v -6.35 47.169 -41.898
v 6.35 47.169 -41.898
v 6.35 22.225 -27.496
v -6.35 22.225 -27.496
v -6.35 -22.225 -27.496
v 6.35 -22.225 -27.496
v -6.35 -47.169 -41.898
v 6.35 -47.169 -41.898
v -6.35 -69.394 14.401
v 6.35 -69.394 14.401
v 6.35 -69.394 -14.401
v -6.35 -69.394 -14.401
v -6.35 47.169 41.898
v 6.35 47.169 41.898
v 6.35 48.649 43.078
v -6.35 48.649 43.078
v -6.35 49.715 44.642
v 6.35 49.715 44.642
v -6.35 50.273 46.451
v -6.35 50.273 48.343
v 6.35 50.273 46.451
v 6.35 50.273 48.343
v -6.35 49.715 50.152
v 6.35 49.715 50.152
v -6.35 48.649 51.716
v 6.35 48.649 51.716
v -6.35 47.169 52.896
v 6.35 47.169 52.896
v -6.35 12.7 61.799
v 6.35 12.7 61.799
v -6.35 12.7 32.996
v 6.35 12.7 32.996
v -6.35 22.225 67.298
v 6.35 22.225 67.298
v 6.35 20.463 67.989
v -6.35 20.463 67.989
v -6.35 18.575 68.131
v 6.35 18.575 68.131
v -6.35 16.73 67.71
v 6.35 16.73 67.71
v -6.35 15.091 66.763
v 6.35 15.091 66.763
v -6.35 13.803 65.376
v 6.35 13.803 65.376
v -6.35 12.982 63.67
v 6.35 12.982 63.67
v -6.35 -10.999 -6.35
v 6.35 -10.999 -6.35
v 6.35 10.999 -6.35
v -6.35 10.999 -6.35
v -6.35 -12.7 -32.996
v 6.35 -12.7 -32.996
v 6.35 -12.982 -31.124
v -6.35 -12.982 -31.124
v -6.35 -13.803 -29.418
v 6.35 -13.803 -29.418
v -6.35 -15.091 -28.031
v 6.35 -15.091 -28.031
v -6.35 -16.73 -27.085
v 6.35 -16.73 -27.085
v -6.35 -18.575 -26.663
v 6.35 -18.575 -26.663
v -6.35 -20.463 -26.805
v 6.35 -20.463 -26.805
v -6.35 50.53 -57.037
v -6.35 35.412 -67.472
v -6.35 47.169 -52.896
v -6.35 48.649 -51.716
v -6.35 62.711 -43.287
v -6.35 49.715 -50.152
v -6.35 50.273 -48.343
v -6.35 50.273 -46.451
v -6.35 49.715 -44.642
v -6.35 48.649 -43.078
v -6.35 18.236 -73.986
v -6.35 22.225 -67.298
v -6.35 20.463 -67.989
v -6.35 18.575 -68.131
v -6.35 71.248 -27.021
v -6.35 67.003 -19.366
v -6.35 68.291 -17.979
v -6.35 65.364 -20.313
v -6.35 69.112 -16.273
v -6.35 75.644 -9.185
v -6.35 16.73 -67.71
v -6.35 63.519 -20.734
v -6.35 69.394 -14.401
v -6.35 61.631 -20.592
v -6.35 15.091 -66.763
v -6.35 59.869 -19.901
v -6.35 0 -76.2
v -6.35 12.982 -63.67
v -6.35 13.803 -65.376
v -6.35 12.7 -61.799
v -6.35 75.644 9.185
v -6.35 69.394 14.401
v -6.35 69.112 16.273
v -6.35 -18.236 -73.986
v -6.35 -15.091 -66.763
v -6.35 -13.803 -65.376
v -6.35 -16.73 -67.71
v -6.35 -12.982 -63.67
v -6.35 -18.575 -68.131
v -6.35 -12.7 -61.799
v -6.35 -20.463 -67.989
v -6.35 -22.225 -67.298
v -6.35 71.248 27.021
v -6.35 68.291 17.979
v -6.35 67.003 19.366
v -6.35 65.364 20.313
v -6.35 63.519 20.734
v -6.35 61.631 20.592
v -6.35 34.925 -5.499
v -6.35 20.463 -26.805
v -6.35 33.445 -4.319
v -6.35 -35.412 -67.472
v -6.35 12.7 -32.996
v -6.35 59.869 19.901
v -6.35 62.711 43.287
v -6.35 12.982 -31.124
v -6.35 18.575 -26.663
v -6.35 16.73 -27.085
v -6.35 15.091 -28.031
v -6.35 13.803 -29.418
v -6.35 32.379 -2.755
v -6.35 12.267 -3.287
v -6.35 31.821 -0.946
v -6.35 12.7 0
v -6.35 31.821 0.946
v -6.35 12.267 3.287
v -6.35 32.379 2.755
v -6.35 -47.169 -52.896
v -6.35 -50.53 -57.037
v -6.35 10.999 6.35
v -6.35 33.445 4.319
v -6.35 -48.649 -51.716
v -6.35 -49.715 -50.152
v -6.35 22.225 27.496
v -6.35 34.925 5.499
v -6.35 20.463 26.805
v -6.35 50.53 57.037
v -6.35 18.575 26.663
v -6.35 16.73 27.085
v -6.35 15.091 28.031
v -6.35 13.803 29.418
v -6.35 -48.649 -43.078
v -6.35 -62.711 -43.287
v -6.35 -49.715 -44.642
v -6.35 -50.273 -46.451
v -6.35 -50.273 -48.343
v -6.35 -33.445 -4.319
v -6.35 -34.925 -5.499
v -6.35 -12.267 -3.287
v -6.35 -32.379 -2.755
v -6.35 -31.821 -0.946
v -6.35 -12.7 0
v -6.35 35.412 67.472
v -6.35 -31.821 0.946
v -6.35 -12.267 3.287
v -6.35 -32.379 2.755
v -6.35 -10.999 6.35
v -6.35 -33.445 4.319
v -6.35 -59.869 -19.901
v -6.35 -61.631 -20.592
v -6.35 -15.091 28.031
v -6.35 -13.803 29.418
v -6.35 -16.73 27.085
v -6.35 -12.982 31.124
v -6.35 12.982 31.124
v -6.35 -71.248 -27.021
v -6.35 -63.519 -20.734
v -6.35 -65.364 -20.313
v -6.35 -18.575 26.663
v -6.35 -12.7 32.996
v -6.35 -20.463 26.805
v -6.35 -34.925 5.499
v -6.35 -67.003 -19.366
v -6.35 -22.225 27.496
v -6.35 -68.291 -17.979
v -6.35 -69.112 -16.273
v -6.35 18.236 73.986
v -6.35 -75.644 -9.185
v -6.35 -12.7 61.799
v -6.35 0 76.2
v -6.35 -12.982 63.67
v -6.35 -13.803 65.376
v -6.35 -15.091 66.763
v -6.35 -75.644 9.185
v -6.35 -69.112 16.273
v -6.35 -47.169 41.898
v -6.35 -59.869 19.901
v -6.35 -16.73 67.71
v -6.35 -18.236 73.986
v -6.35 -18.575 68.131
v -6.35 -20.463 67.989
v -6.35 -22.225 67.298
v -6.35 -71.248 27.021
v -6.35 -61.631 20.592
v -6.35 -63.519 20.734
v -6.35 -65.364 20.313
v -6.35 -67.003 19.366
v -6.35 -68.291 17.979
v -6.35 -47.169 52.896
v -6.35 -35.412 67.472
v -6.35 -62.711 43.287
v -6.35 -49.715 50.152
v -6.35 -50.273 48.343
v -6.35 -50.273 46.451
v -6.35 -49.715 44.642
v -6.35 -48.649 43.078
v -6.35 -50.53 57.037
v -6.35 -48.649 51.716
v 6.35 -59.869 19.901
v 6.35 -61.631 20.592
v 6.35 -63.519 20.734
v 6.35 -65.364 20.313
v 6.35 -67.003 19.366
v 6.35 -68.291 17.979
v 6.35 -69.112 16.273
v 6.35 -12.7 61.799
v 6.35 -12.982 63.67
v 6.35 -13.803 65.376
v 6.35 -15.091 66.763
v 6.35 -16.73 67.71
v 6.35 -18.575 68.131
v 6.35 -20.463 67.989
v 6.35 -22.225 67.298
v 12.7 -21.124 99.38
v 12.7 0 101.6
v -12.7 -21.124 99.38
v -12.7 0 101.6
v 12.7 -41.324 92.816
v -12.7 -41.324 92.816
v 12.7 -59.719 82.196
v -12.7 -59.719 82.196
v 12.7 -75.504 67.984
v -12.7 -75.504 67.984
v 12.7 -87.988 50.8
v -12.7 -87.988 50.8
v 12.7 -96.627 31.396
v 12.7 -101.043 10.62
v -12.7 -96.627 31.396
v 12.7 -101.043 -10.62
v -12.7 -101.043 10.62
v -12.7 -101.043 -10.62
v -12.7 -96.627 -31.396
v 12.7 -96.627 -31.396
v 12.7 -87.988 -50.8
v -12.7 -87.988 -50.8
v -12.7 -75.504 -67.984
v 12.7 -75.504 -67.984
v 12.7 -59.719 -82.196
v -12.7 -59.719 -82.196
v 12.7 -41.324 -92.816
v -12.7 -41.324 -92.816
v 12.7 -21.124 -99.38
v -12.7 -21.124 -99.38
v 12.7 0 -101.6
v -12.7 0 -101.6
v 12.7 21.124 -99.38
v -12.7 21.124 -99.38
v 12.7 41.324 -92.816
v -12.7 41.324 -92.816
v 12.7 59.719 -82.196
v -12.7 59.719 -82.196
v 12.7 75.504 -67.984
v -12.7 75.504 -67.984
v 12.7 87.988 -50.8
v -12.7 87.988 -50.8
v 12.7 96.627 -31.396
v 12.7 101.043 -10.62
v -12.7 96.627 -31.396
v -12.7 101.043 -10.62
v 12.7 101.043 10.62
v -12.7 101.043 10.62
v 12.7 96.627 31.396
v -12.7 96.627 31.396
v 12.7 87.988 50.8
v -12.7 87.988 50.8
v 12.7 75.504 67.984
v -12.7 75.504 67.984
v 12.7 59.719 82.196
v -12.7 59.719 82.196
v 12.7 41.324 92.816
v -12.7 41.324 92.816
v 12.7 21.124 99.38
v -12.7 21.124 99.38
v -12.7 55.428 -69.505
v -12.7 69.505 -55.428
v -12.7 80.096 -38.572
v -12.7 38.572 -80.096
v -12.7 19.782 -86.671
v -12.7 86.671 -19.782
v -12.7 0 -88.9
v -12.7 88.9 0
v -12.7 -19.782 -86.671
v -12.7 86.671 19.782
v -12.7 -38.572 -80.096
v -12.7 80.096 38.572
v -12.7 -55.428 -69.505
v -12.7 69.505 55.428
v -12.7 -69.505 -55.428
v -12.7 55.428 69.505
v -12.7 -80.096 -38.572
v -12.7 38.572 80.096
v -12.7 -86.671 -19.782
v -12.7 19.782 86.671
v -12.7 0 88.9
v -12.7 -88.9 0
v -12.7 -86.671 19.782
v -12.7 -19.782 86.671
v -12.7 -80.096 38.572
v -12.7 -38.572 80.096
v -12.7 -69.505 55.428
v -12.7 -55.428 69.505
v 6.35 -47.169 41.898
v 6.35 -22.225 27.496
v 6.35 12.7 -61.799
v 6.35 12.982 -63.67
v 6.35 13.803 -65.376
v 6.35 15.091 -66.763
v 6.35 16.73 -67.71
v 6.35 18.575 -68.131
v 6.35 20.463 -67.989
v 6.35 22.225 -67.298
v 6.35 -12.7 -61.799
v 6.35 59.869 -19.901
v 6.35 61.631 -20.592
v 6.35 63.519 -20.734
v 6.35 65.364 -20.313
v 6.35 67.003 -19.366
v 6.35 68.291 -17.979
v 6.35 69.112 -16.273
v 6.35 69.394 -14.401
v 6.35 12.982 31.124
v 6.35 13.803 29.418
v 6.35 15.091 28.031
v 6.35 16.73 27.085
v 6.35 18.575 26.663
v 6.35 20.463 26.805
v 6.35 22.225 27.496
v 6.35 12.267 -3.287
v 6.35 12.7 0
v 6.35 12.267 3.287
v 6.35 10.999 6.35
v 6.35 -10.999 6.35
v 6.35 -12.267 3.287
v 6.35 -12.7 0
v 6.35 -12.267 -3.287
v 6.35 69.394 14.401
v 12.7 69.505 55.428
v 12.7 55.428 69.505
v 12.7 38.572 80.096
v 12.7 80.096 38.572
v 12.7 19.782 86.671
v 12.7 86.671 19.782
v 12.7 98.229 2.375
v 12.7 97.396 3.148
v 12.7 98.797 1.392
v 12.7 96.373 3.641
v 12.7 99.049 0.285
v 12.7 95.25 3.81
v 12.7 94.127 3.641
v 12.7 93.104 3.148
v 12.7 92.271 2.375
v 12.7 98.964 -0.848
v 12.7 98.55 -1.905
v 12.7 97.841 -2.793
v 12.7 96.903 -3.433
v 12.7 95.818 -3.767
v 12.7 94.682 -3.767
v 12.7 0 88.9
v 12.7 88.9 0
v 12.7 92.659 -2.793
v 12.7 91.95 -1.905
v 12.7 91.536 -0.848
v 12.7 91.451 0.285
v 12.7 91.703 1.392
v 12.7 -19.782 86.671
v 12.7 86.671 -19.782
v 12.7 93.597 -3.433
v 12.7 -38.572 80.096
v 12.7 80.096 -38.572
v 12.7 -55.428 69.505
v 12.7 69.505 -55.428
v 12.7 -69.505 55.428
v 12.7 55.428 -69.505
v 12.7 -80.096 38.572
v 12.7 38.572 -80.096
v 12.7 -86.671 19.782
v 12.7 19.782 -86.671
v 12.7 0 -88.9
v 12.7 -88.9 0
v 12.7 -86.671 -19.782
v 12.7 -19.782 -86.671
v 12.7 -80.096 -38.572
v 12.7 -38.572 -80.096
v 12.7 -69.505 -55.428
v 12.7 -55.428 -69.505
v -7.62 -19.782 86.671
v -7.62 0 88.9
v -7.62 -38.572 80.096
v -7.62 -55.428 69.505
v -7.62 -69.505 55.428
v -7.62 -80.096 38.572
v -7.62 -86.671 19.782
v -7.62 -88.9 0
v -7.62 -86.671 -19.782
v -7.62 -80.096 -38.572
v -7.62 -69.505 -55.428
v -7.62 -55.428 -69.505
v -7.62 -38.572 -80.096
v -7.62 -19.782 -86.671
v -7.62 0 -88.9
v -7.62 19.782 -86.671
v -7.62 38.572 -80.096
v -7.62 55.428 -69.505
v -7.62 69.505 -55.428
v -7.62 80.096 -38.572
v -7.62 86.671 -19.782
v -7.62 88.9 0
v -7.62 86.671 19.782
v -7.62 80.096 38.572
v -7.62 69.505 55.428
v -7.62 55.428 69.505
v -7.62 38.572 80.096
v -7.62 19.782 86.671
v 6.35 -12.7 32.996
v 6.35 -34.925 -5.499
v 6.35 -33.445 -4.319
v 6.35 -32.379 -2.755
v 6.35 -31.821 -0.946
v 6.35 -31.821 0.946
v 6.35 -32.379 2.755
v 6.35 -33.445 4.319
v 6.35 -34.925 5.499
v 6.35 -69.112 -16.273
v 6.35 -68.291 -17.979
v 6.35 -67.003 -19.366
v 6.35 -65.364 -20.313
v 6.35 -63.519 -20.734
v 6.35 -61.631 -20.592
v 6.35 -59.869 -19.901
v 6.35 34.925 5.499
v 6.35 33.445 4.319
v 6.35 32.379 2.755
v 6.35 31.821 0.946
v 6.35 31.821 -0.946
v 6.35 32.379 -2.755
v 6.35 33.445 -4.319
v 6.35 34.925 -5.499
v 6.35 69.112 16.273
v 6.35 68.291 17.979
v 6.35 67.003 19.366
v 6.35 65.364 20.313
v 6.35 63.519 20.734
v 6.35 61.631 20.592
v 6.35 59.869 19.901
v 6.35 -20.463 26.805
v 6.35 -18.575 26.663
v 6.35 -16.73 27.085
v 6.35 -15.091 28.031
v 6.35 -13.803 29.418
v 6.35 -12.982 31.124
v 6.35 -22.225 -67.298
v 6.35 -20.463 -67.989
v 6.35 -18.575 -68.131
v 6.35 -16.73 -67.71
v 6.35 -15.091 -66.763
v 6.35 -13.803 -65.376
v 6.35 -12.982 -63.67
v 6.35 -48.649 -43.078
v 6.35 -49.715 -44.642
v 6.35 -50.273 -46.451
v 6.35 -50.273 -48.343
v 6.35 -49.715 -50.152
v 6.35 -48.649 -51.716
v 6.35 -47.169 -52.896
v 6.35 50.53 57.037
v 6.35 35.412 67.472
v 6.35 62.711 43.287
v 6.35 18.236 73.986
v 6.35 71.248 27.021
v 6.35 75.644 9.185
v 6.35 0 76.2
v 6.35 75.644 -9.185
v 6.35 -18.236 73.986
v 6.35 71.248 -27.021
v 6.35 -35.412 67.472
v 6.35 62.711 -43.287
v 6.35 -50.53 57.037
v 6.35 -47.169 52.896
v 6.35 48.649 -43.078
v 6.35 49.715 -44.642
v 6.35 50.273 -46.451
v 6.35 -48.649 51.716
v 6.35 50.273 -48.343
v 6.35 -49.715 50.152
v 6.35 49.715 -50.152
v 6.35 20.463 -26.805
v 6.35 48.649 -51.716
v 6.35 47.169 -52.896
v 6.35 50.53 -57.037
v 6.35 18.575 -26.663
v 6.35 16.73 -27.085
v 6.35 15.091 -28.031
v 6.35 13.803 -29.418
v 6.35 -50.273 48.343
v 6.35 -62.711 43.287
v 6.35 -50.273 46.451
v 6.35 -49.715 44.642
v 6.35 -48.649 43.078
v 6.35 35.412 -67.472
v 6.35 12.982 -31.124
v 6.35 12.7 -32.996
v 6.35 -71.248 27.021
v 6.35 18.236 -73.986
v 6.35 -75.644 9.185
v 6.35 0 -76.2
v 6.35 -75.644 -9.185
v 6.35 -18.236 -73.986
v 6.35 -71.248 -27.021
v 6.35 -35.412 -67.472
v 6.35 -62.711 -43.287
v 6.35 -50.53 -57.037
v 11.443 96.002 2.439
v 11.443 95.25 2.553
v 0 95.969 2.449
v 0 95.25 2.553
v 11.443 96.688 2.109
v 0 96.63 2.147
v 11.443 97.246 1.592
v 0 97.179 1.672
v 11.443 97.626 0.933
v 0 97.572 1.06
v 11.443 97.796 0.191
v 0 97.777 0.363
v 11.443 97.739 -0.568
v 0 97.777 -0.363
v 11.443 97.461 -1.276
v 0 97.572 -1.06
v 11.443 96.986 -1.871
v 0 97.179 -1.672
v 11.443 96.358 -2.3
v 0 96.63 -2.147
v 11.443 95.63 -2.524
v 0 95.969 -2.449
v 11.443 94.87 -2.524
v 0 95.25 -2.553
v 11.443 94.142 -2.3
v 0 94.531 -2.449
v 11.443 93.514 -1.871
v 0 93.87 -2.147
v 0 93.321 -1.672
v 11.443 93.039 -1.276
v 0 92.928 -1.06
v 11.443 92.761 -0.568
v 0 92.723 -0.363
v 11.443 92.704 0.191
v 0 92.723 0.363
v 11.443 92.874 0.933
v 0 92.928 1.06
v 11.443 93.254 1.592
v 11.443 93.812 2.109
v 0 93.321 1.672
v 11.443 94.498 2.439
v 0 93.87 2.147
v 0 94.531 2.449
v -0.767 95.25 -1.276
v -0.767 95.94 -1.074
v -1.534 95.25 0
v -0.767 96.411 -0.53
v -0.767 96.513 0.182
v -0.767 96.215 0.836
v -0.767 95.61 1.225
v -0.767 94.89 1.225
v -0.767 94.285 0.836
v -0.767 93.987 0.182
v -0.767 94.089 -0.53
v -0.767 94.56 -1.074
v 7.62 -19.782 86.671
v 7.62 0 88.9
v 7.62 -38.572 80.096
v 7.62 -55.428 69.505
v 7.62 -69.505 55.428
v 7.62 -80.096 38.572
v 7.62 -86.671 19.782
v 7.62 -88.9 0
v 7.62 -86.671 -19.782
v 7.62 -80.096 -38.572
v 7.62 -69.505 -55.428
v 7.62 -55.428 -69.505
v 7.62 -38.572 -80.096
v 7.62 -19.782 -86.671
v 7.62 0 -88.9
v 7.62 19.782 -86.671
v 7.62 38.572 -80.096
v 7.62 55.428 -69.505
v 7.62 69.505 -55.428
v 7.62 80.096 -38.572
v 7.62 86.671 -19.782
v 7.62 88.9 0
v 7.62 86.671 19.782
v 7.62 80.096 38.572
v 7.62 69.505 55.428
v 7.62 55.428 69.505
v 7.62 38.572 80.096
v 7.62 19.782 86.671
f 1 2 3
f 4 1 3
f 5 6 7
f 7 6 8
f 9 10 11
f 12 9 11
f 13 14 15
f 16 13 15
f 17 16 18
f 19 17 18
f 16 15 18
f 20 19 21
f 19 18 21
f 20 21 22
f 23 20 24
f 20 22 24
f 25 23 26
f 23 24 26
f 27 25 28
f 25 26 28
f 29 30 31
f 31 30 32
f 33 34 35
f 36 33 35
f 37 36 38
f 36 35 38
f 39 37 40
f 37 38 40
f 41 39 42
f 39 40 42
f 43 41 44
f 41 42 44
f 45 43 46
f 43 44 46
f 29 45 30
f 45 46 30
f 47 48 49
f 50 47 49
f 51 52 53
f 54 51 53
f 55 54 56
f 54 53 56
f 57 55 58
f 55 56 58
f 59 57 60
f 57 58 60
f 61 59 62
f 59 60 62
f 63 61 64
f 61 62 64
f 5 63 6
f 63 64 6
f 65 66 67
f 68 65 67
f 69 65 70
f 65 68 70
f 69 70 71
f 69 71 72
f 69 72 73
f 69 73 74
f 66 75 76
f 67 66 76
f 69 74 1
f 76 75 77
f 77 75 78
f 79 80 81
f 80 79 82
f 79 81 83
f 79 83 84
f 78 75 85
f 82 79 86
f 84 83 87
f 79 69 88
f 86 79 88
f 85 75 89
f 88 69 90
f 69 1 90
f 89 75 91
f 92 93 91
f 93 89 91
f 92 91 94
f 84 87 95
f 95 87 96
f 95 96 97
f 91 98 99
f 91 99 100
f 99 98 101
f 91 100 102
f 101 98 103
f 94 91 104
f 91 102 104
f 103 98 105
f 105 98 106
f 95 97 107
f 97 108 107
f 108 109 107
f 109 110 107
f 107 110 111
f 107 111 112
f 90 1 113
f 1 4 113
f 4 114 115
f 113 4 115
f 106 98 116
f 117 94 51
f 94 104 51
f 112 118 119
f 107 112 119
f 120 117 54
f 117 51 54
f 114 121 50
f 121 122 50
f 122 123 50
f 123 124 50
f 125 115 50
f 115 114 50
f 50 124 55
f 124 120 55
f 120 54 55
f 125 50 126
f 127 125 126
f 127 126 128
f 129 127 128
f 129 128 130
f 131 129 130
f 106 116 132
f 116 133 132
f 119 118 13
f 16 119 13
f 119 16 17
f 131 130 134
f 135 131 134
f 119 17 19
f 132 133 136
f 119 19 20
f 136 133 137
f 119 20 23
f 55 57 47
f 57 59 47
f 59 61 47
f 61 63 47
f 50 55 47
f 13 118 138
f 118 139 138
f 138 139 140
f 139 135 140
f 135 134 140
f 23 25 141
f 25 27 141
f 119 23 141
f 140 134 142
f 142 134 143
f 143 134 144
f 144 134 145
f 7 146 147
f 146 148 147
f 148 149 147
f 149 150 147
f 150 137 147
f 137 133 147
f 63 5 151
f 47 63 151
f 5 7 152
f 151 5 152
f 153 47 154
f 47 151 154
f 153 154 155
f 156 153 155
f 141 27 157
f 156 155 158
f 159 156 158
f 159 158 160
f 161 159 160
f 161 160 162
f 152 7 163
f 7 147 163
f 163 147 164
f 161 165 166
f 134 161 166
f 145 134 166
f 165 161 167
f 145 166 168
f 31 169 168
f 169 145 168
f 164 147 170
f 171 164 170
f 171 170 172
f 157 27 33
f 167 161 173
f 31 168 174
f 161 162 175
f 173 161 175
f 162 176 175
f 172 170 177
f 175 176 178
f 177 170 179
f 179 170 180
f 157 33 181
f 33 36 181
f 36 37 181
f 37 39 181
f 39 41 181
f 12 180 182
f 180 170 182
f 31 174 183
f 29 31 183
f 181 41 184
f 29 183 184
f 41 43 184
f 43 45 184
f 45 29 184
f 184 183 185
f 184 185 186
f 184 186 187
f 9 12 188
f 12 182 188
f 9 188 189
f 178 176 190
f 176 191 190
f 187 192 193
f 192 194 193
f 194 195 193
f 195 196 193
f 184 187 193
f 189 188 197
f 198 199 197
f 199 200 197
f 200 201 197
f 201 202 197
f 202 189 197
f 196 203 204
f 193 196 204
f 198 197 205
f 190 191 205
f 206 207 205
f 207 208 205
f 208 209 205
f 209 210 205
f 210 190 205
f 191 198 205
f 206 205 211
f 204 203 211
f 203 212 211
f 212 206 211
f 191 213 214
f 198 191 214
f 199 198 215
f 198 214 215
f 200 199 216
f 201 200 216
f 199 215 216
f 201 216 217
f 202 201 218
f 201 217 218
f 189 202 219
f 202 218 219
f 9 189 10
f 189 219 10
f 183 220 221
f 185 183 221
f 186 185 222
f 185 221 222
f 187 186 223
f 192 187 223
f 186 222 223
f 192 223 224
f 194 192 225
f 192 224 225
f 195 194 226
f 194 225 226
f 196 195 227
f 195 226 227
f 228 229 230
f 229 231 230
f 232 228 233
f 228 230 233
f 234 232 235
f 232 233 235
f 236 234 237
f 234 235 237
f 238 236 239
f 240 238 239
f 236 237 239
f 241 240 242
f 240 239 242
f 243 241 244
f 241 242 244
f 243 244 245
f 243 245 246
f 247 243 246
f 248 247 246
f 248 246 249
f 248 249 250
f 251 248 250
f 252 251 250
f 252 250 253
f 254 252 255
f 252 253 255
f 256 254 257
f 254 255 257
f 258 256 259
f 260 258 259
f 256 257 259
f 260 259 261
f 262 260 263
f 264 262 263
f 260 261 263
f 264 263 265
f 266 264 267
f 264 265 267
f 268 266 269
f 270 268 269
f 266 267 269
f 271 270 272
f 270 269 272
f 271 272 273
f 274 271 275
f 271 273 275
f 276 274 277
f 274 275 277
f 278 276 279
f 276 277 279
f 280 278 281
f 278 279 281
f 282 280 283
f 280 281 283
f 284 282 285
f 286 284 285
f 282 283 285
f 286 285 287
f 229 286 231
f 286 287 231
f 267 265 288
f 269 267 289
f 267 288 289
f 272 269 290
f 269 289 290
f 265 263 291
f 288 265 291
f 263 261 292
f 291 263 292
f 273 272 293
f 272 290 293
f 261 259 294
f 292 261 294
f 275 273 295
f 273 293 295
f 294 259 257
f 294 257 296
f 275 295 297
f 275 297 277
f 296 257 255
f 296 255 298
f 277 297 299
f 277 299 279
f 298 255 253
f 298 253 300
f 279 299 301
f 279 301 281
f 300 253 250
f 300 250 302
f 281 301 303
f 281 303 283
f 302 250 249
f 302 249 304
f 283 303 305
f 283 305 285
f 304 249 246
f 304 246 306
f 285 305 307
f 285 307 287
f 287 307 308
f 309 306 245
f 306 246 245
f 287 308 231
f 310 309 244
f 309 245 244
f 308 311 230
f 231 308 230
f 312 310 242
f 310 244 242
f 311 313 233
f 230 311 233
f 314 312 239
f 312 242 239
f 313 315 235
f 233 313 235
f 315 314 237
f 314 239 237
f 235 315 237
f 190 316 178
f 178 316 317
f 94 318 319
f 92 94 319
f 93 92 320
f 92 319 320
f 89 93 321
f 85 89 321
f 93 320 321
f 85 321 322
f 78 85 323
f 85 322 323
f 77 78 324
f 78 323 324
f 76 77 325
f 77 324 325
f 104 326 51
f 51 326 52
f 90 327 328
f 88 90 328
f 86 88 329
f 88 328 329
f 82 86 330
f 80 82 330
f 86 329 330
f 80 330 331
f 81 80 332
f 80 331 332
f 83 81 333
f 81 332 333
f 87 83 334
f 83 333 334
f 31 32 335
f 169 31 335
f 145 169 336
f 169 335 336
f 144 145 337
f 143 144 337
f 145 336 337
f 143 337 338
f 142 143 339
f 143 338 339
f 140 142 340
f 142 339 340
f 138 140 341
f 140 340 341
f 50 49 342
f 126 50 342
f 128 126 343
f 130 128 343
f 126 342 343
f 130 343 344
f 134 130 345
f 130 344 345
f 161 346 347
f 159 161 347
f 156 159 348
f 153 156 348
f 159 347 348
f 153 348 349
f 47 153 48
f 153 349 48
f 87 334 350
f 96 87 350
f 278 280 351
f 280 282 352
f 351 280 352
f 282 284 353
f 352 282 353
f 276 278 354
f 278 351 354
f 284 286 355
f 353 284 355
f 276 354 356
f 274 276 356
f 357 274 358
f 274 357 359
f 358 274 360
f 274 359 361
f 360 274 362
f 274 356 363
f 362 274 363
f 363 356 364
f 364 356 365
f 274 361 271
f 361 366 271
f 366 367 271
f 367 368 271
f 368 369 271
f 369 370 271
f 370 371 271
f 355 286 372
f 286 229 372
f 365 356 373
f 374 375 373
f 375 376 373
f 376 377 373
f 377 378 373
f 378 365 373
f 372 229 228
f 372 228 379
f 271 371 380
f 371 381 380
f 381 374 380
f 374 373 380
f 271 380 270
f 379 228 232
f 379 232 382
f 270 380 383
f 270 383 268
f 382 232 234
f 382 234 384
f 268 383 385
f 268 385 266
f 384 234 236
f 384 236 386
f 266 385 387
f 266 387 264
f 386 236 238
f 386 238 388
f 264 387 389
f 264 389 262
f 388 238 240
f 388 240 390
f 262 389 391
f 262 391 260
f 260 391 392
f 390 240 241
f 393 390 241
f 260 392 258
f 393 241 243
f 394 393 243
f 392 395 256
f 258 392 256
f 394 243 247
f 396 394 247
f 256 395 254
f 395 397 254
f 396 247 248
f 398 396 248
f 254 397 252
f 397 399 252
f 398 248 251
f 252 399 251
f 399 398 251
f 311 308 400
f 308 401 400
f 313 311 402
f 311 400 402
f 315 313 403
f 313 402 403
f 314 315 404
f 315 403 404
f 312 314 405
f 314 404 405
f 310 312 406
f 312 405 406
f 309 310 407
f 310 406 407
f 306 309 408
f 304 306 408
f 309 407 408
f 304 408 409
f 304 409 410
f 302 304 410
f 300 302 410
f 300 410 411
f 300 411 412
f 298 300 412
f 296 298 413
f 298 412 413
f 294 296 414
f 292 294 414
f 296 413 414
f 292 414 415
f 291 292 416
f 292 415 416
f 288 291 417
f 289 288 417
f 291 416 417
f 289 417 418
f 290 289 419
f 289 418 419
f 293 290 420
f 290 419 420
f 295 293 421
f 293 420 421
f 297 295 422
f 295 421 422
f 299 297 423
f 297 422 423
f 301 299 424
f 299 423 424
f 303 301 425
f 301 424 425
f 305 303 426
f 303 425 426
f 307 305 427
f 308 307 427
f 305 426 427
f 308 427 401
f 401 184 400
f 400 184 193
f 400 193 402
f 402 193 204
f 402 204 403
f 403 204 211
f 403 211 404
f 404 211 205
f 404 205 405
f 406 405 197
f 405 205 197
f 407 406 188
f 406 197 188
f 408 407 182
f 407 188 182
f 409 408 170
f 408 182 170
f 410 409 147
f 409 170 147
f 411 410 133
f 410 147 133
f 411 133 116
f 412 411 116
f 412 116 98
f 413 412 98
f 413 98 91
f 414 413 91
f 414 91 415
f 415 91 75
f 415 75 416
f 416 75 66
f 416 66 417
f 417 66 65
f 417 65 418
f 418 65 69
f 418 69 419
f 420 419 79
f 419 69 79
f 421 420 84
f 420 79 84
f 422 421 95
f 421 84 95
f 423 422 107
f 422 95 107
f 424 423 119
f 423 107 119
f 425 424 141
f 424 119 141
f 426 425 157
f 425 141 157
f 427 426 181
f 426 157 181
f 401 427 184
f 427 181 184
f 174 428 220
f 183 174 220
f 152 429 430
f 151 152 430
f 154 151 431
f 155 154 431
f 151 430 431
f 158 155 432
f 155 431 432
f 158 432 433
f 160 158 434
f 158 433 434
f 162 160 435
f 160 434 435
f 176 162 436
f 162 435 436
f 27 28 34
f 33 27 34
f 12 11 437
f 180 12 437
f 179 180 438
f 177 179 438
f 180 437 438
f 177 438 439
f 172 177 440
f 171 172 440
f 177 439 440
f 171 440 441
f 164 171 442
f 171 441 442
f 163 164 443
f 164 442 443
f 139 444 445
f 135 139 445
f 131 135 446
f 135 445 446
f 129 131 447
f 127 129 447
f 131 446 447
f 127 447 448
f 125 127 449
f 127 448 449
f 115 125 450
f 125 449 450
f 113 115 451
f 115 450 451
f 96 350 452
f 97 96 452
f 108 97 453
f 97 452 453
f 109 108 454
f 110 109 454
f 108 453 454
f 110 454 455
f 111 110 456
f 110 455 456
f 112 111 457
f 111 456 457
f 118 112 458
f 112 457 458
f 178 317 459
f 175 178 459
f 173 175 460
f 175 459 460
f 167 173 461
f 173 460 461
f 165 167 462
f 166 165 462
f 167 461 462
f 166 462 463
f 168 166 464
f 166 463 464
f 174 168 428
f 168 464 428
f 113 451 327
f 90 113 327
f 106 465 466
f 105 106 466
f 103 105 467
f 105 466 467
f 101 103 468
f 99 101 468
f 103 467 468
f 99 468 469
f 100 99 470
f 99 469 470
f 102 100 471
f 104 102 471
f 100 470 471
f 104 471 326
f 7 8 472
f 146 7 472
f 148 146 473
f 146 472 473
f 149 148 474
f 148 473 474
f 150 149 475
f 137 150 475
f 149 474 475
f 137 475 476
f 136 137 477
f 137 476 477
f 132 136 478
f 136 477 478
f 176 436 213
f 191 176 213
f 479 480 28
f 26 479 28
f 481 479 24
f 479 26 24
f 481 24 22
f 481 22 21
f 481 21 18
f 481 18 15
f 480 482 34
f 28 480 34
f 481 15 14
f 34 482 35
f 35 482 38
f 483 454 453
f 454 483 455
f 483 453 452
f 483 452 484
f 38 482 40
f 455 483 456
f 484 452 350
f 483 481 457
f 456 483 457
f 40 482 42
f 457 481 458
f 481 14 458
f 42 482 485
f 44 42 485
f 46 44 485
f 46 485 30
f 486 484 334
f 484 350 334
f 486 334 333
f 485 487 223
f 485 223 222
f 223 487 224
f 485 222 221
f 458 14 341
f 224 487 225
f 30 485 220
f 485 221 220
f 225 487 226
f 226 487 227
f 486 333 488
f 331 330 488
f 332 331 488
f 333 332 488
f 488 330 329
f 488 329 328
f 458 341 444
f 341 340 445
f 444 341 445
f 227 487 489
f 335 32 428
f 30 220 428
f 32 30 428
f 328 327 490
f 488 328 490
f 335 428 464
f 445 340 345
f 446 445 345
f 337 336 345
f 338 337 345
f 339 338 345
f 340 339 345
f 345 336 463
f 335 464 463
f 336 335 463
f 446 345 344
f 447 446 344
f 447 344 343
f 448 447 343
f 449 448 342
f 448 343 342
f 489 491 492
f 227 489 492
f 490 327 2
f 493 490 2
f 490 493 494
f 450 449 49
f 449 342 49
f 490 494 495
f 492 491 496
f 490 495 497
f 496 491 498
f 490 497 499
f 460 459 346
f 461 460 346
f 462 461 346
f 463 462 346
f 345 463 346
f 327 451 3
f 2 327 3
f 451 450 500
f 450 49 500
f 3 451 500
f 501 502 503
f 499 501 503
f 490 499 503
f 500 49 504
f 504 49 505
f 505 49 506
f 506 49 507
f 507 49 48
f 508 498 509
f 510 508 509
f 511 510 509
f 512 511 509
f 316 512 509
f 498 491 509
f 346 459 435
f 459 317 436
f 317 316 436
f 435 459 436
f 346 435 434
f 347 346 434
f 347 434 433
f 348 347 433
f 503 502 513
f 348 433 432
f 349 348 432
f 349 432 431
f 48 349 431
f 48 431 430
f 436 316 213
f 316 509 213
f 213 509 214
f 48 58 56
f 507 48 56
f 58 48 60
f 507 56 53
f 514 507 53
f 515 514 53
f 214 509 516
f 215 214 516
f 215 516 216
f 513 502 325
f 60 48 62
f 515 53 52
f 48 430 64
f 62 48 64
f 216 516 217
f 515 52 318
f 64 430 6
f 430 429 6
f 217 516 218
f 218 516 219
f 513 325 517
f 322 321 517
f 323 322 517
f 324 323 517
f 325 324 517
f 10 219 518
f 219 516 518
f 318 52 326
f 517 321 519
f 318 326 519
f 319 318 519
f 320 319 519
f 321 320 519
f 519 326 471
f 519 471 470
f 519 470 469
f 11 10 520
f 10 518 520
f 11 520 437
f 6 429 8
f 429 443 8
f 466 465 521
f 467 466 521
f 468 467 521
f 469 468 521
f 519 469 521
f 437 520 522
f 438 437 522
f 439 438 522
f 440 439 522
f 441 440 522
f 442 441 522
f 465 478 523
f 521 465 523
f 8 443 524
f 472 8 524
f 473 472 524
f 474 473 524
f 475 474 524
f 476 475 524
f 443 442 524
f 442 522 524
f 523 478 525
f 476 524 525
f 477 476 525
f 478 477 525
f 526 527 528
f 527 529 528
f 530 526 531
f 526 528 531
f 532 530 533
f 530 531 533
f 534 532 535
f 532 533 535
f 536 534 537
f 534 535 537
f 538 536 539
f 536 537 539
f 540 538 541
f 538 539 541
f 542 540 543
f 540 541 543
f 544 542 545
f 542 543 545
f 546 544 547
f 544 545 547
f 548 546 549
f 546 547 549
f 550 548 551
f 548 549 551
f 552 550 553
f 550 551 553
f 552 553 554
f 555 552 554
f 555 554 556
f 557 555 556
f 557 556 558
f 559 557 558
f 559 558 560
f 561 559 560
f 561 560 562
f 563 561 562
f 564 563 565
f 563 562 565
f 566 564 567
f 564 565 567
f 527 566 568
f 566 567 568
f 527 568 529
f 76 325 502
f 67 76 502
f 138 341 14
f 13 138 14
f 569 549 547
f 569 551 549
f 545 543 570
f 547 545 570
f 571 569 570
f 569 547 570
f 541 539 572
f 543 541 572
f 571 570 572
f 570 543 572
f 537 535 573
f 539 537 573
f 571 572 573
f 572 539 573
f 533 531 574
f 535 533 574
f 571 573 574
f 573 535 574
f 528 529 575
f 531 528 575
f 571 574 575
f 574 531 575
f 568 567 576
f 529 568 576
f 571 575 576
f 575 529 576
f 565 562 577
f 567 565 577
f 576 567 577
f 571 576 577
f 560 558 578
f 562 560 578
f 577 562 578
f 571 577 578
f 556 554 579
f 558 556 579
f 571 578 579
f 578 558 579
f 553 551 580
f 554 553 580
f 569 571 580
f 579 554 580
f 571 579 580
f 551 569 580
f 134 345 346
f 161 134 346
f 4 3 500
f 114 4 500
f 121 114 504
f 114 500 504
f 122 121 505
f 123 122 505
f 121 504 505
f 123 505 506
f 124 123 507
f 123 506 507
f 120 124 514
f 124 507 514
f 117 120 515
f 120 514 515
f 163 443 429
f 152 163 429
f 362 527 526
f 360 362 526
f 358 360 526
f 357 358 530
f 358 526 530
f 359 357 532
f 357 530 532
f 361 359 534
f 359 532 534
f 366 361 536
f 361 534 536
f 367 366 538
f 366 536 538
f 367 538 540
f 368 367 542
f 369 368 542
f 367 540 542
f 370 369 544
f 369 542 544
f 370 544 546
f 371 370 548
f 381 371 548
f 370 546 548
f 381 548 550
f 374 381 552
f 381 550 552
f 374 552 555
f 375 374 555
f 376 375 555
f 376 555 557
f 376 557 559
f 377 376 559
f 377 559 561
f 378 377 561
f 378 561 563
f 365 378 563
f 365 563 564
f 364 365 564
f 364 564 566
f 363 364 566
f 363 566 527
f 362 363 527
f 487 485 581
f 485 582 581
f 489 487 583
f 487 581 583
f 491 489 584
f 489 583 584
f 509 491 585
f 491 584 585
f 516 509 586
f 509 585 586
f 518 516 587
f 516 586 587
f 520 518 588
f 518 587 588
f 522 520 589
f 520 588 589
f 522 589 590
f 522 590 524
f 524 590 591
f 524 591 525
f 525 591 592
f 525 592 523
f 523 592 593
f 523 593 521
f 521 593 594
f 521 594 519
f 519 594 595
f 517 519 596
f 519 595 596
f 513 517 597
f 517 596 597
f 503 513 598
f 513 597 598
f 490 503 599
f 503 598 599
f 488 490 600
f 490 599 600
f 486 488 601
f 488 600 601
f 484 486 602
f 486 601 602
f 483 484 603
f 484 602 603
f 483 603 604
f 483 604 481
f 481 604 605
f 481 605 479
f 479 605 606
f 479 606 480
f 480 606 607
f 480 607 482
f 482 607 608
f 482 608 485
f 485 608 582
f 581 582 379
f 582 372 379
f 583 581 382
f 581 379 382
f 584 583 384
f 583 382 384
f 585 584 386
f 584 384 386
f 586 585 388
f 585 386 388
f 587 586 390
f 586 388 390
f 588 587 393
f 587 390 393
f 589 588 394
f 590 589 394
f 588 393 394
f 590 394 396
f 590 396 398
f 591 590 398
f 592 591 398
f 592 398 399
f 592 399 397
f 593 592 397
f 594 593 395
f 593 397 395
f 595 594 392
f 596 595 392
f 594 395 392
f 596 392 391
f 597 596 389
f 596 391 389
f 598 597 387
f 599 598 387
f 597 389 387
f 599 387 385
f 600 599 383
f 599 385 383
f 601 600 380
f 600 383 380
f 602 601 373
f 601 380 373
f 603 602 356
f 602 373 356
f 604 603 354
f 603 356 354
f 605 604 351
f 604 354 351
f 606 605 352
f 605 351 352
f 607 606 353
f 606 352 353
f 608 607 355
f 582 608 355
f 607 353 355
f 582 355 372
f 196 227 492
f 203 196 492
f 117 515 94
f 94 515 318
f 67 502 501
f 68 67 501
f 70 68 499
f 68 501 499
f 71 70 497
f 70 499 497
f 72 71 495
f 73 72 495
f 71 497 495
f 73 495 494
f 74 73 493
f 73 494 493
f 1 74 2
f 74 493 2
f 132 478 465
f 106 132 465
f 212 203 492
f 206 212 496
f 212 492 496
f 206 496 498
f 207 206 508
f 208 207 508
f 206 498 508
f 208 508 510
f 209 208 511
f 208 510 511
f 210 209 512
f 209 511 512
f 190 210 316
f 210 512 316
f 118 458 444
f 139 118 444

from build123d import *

# Parameters (mm, degrees)
CUT_EXTRUDE1_DEPTH                = 145.941445074
CIRPATTERN1_COUNT                 = 6
CUT_EXTRUDE2_DEPTH                = 145.941445074
F_1_4_20_TAPPED_HOLE1_D           = 5.1054
F_1_4_20_TAPPED_HOLE1_DEPTH       = 12.7
F_1_4_20_TAPPED_HOLE1_CSINK_D     = 7.62
F_1_4_20_TAPPED_HOLE1_CSINK_ANGLE = 90
F_1_4_20_TAPPED_HOLE1_TIP         = 1.533816902


with BuildPart() as part:
    # Sketch1 → Revolve1 (revolve)
    with BuildSketch(Plane.XY, mode=Mode.PRIVATE) as revolve1_sk:
        Polygon((-6.35, 0), (6.35, 0), (6.35, 76.2), (7.62, 88.9), (12.7, 88.9), (12.7, 101.6), (-12.7, 101.6), (-12.7, 88.9), (-7.62, 88.9), (-6.35, 76.2), align=None)
    revolve(revolve1_sk.sketch.rotate(Axis((-21.230059302, 0, 0), (1, 0, 0)), 90), axis=Axis((-21.230059302, 0, 0), (1, 0, 0)))

    # Sketch2 → Cut-Extrude1 (cut, through all)
    with BuildSketch(Plane(origin=(6.35, 0, 0), x_dir=(0, 0, -1), z_dir=(1, 0, 0))):
        with BuildLine():
            Line((5.499261314, 34.925), (19.900738686, 59.869090512))
            ThreePointArc((19.900738686, 59.869090512), (19.900738686, 66.219090512), (14.401477372, 69.394090512))
            Line((14.401477372, 69.394090512), (-14.401477372, 69.394090512))
            ThreePointArc((-14.401477372, 69.394090512), (-19.900738686, 66.219090512), (-19.900738686, 59.869090512))
            Line((-19.900738686, 59.869090512), (-5.499261314, 34.925))
            ThreePointArc((-5.499261314, 34.925), (0, 31.75), (5.499261314, 34.925))
        make_face()
    cut_extrude1 = extrude(amount=-CUT_EXTRUDE1_DEPTH, mode=Mode.SUBTRACT)

    # CirPattern1: Cut-Extrude1 ×6 about axis
    cirpattern1_axis = Axis((0, 0, 0), (1, 0, 0))
    for i in range(1, CIRPATTERN1_COUNT):
        add(cut_extrude1.rotate(cirpattern1_axis, i * 360 / CIRPATTERN1_COUNT), mode=Mode.SUBTRACT)

    # Sketch3 → Cut-Extrude2 (cut, through all)
    with BuildSketch(Plane(origin=(6.35, 0, 0), x_dir=(0, 0, -1), z_dir=(1, 0, 0))):
        with BuildLine():
            Line((-6.35, 10.998522628), (-6.35, -10.998522628))
            ThreePointArc((-6.35, -10.998522628), (0, -12.7), (6.35, -10.998522628))
            Line((6.35, -10.998522628), (6.35, 10.998522628))
            ThreePointArc((6.35, 10.998522628), (0, 12.7), (-6.35, 10.998522628))
        make_face()
    extrude(amount=-CUT_EXTRUDE2_DEPTH, mode=Mode.SUBTRACT)

    # 1/4-20 Tapped Hole1
    with Locations(Plane(origin=(12.7, 0, 0), x_dir=(0, 0, -1), z_dir=(1, 0, 0))):
        with Locations((0, 95.25)):
            CounterSinkHole(F_1_4_20_TAPPED_HOLE1_D / 2, F_1_4_20_TAPPED_HOLE1_CSINK_D / 2, depth=F_1_4_20_TAPPED_HOLE1_DEPTH, counter_sink_angle=F_1_4_20_TAPPED_HOLE1_CSINK_ANGLE)
            with Locations((0, 0, -(F_1_4_20_TAPPED_HOLE1_DEPTH + F_1_4_20_TAPPED_HOLE1_TIP / 2))):  # 118° drill point
                Cone(0, F_1_4_20_TAPPED_HOLE1_D / 2, F_1_4_20_TAPPED_HOLE1_TIP, mode=Mode.SUBTRACT)


solid = part.part
